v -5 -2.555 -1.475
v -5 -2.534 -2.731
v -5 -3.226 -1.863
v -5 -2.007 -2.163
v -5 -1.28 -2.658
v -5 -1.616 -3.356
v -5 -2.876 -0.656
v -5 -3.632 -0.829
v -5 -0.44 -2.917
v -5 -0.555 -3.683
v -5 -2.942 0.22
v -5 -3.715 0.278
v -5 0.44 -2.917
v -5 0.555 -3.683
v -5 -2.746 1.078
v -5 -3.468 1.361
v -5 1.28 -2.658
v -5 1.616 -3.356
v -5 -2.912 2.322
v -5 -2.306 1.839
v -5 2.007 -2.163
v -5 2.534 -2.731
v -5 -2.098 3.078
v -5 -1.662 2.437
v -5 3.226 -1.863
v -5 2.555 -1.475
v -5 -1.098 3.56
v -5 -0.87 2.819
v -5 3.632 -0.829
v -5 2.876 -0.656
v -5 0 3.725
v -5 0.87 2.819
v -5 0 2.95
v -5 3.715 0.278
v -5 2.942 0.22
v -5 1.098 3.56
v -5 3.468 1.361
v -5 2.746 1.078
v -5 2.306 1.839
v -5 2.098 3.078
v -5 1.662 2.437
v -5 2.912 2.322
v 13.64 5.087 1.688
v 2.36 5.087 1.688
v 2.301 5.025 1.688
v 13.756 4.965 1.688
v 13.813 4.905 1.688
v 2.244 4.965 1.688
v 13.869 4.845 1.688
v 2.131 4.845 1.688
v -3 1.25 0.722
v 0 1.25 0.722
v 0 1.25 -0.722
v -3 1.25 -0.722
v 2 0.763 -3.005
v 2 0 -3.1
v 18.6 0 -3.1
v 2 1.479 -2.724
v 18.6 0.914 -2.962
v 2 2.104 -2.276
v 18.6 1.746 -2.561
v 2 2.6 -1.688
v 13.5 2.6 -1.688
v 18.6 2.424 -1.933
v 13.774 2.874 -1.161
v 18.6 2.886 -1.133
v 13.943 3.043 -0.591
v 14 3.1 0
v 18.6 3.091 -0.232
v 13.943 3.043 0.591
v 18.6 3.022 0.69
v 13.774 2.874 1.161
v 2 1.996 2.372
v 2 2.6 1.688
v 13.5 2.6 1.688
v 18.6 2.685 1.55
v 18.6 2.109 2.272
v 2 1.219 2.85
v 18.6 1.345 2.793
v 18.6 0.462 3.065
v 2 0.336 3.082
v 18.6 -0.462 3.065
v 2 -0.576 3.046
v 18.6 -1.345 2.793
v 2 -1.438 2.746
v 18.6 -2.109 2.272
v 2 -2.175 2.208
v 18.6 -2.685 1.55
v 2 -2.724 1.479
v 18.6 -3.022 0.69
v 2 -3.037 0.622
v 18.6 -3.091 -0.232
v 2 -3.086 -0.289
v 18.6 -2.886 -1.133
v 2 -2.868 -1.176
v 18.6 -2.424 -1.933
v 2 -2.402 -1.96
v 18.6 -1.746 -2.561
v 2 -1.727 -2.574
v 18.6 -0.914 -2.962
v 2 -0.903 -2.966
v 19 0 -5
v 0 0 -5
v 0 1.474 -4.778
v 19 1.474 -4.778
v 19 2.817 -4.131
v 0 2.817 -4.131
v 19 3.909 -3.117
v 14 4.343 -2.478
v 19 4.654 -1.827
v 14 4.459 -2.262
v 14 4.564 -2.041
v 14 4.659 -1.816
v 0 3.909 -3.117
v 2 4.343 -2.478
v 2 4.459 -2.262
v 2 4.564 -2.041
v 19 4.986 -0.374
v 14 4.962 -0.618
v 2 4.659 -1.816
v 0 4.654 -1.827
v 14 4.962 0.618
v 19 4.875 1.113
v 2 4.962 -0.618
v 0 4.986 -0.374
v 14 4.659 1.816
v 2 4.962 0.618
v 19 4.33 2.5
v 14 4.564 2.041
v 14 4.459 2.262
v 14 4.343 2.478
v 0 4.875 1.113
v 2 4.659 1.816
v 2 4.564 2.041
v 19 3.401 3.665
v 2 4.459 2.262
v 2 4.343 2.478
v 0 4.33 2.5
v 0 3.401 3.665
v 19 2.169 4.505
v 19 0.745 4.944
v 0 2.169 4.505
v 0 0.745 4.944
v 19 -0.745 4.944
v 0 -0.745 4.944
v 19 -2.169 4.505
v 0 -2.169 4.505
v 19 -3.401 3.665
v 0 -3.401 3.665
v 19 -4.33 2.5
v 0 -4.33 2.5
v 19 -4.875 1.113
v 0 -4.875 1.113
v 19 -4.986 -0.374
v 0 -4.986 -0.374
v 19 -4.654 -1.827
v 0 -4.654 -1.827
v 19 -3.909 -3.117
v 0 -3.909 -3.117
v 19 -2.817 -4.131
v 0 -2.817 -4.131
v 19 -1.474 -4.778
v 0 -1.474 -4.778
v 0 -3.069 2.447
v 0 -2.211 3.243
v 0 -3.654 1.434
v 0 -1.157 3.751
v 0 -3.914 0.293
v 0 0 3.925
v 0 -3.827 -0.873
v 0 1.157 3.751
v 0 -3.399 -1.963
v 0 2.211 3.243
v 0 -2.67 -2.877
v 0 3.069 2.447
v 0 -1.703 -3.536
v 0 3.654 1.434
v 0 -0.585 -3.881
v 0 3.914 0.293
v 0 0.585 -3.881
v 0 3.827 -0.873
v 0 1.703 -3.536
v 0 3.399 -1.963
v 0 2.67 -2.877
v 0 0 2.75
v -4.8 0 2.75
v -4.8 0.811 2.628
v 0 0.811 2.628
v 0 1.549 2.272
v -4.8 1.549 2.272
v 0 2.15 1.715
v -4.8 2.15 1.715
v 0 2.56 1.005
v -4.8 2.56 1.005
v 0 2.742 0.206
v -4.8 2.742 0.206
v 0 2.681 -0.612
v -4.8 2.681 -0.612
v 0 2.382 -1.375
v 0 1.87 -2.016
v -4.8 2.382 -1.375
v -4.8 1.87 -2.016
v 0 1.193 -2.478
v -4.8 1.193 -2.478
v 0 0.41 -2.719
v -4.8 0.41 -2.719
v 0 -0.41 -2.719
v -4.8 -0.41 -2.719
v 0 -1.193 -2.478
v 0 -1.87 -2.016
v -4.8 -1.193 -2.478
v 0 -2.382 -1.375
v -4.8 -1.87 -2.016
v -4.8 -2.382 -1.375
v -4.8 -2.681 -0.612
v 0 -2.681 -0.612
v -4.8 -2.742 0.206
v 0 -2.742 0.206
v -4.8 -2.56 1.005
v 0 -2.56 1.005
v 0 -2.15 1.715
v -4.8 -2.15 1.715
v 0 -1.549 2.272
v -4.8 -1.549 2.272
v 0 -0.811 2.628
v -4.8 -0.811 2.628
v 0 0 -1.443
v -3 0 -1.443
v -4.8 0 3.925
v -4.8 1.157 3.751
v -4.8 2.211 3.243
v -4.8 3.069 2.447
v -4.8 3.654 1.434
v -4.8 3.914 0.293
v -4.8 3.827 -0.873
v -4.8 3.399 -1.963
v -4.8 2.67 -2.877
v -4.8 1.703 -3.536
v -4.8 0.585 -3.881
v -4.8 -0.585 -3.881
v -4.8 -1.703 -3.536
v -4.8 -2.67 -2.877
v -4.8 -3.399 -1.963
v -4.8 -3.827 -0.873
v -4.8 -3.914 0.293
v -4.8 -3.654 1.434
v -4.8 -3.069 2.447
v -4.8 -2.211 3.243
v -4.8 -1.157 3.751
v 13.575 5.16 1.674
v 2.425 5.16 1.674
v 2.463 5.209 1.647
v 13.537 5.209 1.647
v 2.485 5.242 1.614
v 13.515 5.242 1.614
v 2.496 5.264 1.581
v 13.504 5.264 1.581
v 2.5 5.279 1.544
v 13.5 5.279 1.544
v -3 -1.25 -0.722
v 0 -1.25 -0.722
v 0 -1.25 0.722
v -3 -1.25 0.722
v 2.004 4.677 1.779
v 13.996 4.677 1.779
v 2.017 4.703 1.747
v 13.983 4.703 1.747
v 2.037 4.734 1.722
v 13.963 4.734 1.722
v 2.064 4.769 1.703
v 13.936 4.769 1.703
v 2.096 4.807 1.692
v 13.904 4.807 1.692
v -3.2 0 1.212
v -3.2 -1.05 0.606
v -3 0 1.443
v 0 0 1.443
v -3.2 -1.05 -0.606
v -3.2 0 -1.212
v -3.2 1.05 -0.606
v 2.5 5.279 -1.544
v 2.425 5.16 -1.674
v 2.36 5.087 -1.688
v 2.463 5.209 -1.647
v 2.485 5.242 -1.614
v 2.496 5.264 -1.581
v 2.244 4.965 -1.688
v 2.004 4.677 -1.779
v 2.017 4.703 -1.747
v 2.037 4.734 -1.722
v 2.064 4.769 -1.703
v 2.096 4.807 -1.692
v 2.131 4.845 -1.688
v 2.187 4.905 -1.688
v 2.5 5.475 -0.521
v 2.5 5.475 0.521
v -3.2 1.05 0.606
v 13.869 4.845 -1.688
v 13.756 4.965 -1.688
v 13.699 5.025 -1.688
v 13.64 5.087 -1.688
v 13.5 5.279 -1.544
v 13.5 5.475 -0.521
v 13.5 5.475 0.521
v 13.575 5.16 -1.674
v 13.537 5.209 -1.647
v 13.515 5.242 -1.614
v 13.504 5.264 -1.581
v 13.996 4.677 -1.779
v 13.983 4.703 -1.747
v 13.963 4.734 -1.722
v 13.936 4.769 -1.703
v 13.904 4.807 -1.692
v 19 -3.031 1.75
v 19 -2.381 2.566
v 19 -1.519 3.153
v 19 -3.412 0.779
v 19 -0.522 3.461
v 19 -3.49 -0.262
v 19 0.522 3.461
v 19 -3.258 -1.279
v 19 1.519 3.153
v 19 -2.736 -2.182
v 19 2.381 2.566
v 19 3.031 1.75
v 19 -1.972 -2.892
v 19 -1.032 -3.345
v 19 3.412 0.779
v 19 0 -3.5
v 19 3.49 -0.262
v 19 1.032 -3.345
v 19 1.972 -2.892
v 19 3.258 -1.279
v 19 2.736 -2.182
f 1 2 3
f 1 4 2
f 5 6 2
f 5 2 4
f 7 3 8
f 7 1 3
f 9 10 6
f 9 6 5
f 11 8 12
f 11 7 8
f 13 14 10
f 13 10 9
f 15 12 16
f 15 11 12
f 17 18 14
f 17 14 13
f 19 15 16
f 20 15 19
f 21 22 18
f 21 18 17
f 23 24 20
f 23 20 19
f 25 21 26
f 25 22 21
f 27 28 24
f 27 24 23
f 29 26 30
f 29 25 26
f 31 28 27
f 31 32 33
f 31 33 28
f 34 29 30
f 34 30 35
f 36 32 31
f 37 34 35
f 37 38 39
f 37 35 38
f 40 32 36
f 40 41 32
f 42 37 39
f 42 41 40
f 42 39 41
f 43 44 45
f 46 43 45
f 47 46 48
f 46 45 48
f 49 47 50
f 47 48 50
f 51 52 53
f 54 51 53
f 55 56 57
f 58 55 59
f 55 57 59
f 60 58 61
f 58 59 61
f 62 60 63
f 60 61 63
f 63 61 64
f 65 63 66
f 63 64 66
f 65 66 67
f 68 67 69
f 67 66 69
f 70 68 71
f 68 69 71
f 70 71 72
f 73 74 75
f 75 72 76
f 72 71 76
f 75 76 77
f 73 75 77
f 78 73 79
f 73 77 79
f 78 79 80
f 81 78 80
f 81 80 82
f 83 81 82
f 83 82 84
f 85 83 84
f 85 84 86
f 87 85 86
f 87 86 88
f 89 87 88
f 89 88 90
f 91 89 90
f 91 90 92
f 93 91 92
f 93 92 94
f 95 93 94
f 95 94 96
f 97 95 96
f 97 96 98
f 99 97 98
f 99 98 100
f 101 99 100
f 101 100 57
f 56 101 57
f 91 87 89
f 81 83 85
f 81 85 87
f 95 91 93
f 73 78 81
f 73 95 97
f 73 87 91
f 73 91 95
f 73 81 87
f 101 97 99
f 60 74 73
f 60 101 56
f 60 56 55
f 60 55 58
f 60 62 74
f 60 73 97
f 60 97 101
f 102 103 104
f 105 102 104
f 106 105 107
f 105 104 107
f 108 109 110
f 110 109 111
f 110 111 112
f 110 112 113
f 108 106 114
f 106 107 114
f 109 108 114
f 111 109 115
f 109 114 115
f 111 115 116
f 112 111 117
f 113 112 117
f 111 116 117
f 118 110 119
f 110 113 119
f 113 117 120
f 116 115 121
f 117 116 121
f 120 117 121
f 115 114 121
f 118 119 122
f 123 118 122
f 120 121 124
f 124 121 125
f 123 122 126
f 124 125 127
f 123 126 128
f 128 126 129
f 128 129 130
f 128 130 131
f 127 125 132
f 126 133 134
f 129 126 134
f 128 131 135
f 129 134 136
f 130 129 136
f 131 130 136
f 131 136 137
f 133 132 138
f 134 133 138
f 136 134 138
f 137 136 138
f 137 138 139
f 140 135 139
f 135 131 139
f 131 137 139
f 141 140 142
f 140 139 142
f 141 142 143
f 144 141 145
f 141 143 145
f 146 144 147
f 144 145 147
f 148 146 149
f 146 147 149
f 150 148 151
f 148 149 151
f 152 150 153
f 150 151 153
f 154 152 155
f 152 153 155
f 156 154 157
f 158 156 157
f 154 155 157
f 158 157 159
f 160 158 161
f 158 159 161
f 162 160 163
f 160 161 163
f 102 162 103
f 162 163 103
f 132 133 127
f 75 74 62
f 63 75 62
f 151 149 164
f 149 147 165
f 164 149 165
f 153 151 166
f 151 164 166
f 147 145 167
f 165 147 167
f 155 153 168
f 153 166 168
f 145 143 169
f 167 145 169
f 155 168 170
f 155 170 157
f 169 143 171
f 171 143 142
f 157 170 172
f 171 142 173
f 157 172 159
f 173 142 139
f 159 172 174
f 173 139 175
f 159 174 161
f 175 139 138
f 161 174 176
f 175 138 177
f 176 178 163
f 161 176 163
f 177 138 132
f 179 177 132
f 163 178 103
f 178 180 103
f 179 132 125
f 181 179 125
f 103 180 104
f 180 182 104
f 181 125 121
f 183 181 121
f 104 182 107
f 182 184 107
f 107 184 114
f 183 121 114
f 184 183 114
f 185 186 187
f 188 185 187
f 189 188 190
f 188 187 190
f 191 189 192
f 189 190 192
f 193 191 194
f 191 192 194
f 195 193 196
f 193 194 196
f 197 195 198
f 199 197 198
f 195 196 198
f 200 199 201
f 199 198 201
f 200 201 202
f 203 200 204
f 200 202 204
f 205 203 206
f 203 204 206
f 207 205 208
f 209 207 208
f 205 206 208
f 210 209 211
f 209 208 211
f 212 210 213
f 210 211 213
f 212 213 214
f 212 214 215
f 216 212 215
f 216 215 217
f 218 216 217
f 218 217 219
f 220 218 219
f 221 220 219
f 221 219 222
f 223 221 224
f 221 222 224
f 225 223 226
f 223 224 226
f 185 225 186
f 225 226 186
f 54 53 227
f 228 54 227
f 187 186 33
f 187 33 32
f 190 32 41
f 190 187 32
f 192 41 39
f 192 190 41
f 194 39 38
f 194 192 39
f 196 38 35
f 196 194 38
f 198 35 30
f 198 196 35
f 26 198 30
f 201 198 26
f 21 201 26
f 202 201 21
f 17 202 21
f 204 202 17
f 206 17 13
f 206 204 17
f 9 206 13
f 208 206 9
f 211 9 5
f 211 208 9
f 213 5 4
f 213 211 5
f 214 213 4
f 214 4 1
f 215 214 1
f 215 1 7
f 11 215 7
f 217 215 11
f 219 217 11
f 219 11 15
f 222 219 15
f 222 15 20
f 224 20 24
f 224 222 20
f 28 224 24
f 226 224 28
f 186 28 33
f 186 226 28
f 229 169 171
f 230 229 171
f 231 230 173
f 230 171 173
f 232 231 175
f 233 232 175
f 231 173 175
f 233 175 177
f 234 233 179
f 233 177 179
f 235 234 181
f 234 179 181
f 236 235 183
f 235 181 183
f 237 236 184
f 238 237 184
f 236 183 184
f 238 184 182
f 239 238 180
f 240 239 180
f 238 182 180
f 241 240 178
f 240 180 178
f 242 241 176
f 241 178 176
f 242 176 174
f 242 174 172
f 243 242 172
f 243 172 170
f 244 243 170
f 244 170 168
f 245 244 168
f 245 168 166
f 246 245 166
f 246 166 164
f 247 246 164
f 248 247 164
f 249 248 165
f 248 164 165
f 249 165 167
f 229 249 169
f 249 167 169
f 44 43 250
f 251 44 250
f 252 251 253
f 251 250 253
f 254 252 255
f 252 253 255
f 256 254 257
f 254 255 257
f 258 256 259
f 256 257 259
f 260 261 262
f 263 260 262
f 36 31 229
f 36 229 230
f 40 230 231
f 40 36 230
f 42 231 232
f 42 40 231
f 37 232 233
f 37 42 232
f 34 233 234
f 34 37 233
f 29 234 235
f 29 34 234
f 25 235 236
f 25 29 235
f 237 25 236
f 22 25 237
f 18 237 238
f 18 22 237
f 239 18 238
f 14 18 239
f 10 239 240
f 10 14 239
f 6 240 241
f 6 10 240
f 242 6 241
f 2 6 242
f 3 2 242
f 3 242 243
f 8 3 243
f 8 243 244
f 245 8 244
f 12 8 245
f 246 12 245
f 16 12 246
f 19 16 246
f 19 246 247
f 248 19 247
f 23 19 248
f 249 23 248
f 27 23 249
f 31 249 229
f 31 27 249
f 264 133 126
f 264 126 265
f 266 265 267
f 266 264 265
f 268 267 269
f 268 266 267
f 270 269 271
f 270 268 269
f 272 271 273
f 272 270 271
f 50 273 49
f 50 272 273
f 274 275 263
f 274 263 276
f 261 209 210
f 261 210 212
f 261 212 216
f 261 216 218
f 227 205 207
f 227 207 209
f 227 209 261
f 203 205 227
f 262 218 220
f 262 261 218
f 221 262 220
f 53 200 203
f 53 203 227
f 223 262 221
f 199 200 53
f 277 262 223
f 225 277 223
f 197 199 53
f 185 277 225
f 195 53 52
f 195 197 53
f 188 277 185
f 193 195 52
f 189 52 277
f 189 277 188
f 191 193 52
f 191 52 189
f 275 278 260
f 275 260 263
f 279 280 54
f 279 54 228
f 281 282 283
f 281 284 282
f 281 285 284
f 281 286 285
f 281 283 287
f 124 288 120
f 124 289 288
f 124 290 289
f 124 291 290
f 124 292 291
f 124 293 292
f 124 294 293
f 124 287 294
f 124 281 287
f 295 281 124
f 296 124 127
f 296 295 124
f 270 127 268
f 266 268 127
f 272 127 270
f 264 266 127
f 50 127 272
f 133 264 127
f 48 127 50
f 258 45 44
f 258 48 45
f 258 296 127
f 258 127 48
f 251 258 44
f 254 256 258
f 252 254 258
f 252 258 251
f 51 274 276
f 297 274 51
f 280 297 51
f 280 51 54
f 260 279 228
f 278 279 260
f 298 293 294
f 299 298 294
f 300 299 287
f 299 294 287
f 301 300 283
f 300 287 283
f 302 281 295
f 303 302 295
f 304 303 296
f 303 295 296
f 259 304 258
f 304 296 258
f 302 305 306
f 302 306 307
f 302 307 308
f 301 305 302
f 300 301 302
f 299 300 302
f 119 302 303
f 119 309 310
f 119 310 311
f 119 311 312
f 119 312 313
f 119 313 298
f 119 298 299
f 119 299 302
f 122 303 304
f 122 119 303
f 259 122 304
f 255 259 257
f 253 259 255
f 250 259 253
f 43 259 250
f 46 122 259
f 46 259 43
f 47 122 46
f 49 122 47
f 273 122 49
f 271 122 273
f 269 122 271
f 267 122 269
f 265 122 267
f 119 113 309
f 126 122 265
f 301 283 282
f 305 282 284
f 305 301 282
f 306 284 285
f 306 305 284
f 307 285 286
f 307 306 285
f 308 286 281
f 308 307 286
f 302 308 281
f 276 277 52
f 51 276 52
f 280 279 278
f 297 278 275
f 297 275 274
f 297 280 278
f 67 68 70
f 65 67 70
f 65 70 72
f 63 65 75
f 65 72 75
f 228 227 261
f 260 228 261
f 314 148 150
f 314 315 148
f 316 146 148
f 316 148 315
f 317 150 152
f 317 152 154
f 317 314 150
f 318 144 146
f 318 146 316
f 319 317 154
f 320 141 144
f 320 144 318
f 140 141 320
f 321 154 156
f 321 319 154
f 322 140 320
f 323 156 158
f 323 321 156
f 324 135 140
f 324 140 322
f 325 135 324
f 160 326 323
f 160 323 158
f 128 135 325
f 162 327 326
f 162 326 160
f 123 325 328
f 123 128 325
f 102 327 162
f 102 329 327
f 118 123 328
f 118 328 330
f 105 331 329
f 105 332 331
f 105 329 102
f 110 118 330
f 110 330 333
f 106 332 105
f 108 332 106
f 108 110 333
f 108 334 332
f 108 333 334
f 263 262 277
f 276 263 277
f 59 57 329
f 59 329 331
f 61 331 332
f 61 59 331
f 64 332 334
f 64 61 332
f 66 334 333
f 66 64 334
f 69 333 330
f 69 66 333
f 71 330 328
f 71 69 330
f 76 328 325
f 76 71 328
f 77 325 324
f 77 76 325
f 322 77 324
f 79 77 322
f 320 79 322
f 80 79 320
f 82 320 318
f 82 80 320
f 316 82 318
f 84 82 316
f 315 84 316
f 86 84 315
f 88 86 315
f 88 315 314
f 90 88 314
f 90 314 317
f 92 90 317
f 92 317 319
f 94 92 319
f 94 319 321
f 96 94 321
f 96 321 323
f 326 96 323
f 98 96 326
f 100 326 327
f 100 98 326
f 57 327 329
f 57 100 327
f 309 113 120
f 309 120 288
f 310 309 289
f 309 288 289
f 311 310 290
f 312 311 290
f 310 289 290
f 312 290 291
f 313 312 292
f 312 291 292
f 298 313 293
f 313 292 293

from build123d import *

# Parameters (mm, degrees)
SKETCH_1_R          = 5
EXTRUDE_1_DEPTH     = 19
SKETCH_3_R          = 3.1
CUT_EXTRUDE_1_DEPTH = 17
EXTRUDE_2_DEPTH     = 12
SKETCH_8_R          = 3.925
EXTRUDE_4_DEPTH     = 5
SKETCH_9_R          = 2.75
CUT_EXTRUDE_2_DEPTH = 5
EXTRUDE_5_DEPTH     = 3.2
FILLET_1_R          = 0.2
CHAMFER_1_SIZE      = 0.5
CHAMFER_2_SIZE      = 0.4
CHAMFER_3_SIZE      = 0.2


with BuildPart() as part:
    # 草图1 → 凸台-拉伸1 (new body)
    with BuildSketch(Plane(origin=(0, 0, 0), x_dir=(0, 0, -1), z_dir=(1, 0, 0))):
        Circle(SKETCH_1_R)
    extrude(amount=EXTRUDE_1_DEPTH)

    # 草图3 → 切除-拉伸1 (cut)
    with BuildSketch(Plane(origin=(19, 0, 0), x_dir=(0, 0, -1), z_dir=(1, 0, 0))):
        Circle(SKETCH_3_R)
    extrude(amount=-CUT_EXTRUDE_1_DEPTH, mode=Mode.SUBTRACT)

    # 草图5 → 凸台-拉伸2 (add)
    with BuildSketch(Plane(origin=(2, 0, 0), x_dir=(0, 0, -1), z_dir=(1, 0, 0))):
        with BuildLine():
            Line((-1.688194302, 2.6), (1.688194302, 2.6))
            Line((1.688194302, 2.6), (1.688194302, 5.234500931))
            ThreePointArc((1.688194302, 5.234500931), (0, 5.5), (-1.688194302, 5.234500931))
            Line((-1.688194302, 5.234500931), (-1.688194302, 2.6))
        make_face()
    extrude(amount=EXTRUDE_2_DEPTH)

    # 草图8 → 凸台-拉伸4 (add)
    with BuildSketch(Plane.ZY):
        Circle(SKETCH_8_R)
    extrude(amount=EXTRUDE_4_DEPTH)

    # 草图9 → 切除-拉伸2 (cut)
    with BuildSketch(Plane.ZY.offset(5)):
        Circle(SKETCH_9_R)
    extrude(amount=-CUT_EXTRUDE_2_DEPTH, mode=Mode.SUBTRACT)

    # 草图10 → 凸台-拉伸5 (add)
    with BuildSketch(Plane.ZY):
        Polygon((0.721687836, 1.25), (-0.721687836, 1.25), (-1.443375673, 0), (-0.721687836, -1.25), (0.721687836, -1.25), (1.443375673, 0), align=None)
    extrude(amount=EXTRUDE_5_DEPTH)

    # 圆角1
    fillet_1_edges = [part.edges().sort_by_distance(p)[0] for p in [
        (8, 4.70637865, 1.688194302),
        (8, 5.234500931, 1.688194302),
        (8, 4.70637865, -1.688194302),
        (8, 5.234500931, -1.688194302),
    ]]
    fillet(fillet_1_edges, radius=FILLET_1_R)

    # 倒角1
    # the kernel refuses this chamfer: 0.5 mm, written as the material it takes off along each edge
    with BuildSketch(Plane(origin=(14, 0, 0), x_dir=(0, 0.8686030413593419, -0.4955085837211114), z_dir=(0, -0.4955085837211114, -0.8686030413593419))) as chamfer_1_piece_1:
        Polygon((5.5, -CHAMFER_1_SIZE), (5.5 - CHAMFER_1_SIZE, 0), (5.5, 0), align=None)
    revolve(axis=Axis((14, 0, 0), (1, 0, 0)), revolution_arc=59.40658503, mode=Mode.SUBTRACT)
    with BuildSketch(Plane(origin=(2, 0, 0), x_dir=(0, 0.8686030413593415, -0.4955085837211117), z_dir=(0, -0.4955085837211117, -0.8686030413593415))) as chamfer_1_piece_2:
        Polygon((5.5 - CHAMFER_1_SIZE, 0), (5.5, CHAMFER_1_SIZE), (5.5, 0), align=None)
    revolve(axis=Axis((2, 0, 0), (1, 0, 0)), revolution_arc=59.40658503, mode=Mode.SUBTRACT)
    with BuildSketch(Plane(origin=(14, 2.6, 2.974035796), x_dir=(0.027495876610585623, 0.9996219169112968, 0), z_dir=(0, 0, -1))) as chamfer_1_piece_3_section:
        Polygon((CHAMFER_1_SIZE * 0.999621916911, -CHAMFER_1_SIZE * 0.0274958766106), (-CHAMFER_1_SIZE * 0.0274958766106, -CHAMFER_1_SIZE * 0.999621916911), (0, 0), align=None)
    chamfer_1_piece_3 = extrude(amount=5.948071591, mode=Mode.PRIVATE)
    chamfer_1_piece_3 = chamfer_1_piece_3 & Plane(origin=(13.821912141, 0, 0), x_dir=(0, 0, -1), z_dir=(1, 0, 0)) * Cylinder(3.1, 14, mode=Mode.PRIVATE)
    add(chamfer_1_piece_3, mode=Mode.SUBTRACT)

    # 倒角2
    chamfer_2_edges = [part.edges().sort_by_distance(p)[0] for p in [
        (19, 0, 3.1),
    ]]
    chamfer(chamfer_2_edges, length=CHAMFER_2_SIZE)

    # 倒角3
    chamfer_3_edges = [part.edges().sort_by_distance(p)[0] for p in [
        (-5, 0, -3.925),
        (-5, 0, -2.75),
        (-3.2, 0.625, 1.082531755),
        (-3.2, 1.25, 0),
        (-3.2, 0.625, -1.082531755),
        (-3.2, -0.625, -1.082531755),
        (-3.2, -1.25, 0),
        (-3.2, -0.625, 1.082531755),
    ]]
    chamfer(chamfer_3_edges, length=CHAMFER_3_SIZE)


solid = part.part
